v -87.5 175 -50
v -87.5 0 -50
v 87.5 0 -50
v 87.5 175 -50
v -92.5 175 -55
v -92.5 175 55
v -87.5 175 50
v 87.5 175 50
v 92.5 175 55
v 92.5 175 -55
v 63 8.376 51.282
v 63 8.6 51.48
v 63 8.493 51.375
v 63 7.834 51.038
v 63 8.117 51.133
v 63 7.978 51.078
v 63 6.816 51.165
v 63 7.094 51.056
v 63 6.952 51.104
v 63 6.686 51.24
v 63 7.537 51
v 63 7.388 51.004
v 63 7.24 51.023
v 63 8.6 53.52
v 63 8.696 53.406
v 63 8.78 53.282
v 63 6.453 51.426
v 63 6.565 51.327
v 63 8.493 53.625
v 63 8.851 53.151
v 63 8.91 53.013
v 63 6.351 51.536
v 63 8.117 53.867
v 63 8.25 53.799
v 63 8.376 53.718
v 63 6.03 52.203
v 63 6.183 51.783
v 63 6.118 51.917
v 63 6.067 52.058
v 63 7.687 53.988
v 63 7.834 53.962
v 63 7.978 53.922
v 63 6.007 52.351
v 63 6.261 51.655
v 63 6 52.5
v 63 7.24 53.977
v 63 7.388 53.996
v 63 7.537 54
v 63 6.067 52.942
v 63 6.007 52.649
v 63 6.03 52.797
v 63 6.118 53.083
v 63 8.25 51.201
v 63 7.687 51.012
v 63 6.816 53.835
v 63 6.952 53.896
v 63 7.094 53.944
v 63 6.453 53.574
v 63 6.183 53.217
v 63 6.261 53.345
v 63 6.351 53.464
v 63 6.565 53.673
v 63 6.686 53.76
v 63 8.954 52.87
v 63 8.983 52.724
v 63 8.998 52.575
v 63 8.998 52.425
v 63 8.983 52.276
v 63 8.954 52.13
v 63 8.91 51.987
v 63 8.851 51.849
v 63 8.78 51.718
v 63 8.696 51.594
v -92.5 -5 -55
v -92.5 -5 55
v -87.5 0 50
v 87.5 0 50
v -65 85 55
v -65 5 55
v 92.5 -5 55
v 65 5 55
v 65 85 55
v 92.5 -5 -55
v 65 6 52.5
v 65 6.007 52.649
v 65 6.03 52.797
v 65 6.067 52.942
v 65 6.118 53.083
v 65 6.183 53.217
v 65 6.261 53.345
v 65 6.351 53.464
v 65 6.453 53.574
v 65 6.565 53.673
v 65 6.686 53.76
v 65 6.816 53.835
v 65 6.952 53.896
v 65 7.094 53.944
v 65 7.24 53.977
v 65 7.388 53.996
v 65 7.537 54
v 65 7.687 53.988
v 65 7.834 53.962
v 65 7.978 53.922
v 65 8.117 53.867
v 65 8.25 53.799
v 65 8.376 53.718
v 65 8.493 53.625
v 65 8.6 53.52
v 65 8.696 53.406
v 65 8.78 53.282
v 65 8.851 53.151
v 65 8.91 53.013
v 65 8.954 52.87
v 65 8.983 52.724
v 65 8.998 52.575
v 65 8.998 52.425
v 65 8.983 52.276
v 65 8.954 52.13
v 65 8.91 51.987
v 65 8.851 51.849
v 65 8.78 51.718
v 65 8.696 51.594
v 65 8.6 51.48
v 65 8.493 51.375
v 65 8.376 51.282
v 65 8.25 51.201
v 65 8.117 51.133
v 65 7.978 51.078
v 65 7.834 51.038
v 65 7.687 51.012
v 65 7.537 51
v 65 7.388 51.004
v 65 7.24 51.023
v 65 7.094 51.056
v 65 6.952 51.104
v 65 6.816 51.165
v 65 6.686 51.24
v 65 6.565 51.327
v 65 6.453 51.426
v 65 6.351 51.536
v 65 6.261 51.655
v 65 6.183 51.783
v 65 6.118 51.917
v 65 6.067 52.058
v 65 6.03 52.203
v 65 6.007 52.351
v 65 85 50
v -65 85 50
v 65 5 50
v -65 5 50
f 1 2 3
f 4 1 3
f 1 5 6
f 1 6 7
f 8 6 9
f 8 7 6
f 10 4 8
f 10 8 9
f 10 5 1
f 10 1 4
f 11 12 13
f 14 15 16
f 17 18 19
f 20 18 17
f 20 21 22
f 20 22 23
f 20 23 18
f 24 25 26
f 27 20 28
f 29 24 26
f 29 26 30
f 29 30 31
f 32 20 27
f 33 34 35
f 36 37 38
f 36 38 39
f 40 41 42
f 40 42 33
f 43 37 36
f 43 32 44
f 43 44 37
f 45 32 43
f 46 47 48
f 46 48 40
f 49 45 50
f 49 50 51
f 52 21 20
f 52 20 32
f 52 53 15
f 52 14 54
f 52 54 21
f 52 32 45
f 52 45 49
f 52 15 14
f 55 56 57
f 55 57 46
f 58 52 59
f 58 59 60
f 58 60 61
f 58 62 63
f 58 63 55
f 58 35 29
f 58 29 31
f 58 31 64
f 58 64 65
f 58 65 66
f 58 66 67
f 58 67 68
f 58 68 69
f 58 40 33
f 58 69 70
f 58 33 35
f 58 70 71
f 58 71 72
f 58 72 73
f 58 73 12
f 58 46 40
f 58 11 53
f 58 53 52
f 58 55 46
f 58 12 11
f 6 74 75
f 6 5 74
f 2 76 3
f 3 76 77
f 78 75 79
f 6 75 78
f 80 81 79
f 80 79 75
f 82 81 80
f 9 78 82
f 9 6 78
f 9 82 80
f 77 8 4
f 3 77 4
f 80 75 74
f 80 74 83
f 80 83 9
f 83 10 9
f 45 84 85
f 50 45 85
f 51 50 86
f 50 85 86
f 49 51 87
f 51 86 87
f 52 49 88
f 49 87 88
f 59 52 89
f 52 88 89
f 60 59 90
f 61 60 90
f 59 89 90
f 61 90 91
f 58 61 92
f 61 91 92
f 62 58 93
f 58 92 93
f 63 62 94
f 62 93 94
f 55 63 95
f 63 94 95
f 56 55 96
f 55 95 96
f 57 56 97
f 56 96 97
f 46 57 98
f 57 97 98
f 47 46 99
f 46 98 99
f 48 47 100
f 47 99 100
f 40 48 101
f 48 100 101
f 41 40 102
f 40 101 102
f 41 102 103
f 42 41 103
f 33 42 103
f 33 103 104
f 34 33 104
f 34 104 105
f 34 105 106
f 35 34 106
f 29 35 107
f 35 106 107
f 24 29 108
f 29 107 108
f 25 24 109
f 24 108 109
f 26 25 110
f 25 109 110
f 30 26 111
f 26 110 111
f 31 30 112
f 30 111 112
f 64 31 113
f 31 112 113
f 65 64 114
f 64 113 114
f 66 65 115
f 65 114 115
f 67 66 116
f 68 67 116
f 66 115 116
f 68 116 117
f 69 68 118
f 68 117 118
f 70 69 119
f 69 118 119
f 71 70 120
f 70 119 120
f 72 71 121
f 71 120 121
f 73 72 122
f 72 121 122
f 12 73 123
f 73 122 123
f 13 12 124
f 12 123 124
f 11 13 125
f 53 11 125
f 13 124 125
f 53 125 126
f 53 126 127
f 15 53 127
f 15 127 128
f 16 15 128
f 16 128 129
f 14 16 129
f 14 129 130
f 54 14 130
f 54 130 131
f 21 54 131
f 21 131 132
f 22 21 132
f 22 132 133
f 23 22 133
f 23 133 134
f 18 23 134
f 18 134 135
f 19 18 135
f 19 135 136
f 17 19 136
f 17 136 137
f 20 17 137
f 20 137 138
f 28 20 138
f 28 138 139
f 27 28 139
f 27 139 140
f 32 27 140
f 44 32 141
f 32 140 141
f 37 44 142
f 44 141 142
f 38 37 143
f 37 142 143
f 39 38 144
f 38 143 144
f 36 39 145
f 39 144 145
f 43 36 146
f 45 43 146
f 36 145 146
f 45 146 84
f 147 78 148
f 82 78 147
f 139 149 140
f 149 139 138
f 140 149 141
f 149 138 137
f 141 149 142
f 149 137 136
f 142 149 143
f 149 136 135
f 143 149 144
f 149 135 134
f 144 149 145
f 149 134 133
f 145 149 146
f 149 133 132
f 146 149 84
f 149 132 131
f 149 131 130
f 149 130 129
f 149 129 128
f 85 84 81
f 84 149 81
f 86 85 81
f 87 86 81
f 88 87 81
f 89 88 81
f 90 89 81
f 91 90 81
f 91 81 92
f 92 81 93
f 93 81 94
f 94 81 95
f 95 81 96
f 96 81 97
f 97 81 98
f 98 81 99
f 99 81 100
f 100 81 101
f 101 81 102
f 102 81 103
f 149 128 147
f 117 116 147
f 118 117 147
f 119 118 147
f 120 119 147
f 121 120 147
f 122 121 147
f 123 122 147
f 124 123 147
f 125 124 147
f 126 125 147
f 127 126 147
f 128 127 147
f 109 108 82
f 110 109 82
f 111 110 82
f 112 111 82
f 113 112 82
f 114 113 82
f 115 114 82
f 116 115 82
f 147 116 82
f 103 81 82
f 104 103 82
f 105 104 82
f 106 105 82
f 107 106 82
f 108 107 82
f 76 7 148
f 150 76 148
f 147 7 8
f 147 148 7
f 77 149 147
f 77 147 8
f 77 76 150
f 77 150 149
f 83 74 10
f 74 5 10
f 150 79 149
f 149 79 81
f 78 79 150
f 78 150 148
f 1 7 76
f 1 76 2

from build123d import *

# Parameters (mm, degrees)
SKETCH1_W           = 185
SKETCH1_H           = 110
SKETCH1_W_2         = 175
SKETCH1_H_2         = 100
EXTRUDE_THIN1_DEPTH = 175
SKETCH2_W           = 185
SKETCH2_H           = 110
BOSS_EXTRUDE2_DEPTH = 5
CUT_EXTRUDE2_REACH  = 228.454
SKETCH5_W           = 130
SKETCH5_H           = 80
SKETCH6_R           = 1.5
BOSS_EXTRUDE3_DEPTH = 2


with BuildPart() as part:
    # Sketch1 → Extrude-Thin1 (new body)
    with BuildSketch(Plane(origin=(0, 0, 0), x_dir=(1, 0, 0), z_dir=(0, 1, 0))):
        Rectangle(SKETCH1_W, SKETCH1_H)
        Rectangle(SKETCH1_W_2, SKETCH1_H_2, mode=Mode.SUBTRACT)
    extrude(amount=EXTRUDE_THIN1_DEPTH)

    # Sketch2 → Boss-Extrude2 (add)
    with BuildSketch(Plane.XZ):
        Rectangle(SKETCH2_W, SKETCH2_H)
    extrude(amount=BOSS_EXTRUDE2_DEPTH)

    # Sketch5 → Cut-Extrude2 (cut, up to next)
    with BuildSketch(Plane.XY.offset(55), mode=Mode.PRIVATE) as cut_extrude2_sk1:
        with Locations((0, 45)):
            Rectangle(SKETCH5_W, SKETCH5_H)
    cut_extrude2_tool1 = extrude(cut_extrude2_sk1.sketch, amount=-CUT_EXTRUDE2_REACH, mode=Mode.PRIVATE) & part.part
    add(cut_extrude2_tool1.solids().sort_by_distance((0, 45, 55))[0], mode=Mode.SUBTRACT)

    # Sketch6 → Boss-Extrude3 (add)
    with BuildSketch(Plane.ZY.offset(-65)):
        with Locations(Location((52.5, 7.5, 0), (0, 0, 270))):
            Circle(SKETCH6_R)
    extrude(amount=BOSS_EXTRUDE3_DEPTH)


solid = part.part
